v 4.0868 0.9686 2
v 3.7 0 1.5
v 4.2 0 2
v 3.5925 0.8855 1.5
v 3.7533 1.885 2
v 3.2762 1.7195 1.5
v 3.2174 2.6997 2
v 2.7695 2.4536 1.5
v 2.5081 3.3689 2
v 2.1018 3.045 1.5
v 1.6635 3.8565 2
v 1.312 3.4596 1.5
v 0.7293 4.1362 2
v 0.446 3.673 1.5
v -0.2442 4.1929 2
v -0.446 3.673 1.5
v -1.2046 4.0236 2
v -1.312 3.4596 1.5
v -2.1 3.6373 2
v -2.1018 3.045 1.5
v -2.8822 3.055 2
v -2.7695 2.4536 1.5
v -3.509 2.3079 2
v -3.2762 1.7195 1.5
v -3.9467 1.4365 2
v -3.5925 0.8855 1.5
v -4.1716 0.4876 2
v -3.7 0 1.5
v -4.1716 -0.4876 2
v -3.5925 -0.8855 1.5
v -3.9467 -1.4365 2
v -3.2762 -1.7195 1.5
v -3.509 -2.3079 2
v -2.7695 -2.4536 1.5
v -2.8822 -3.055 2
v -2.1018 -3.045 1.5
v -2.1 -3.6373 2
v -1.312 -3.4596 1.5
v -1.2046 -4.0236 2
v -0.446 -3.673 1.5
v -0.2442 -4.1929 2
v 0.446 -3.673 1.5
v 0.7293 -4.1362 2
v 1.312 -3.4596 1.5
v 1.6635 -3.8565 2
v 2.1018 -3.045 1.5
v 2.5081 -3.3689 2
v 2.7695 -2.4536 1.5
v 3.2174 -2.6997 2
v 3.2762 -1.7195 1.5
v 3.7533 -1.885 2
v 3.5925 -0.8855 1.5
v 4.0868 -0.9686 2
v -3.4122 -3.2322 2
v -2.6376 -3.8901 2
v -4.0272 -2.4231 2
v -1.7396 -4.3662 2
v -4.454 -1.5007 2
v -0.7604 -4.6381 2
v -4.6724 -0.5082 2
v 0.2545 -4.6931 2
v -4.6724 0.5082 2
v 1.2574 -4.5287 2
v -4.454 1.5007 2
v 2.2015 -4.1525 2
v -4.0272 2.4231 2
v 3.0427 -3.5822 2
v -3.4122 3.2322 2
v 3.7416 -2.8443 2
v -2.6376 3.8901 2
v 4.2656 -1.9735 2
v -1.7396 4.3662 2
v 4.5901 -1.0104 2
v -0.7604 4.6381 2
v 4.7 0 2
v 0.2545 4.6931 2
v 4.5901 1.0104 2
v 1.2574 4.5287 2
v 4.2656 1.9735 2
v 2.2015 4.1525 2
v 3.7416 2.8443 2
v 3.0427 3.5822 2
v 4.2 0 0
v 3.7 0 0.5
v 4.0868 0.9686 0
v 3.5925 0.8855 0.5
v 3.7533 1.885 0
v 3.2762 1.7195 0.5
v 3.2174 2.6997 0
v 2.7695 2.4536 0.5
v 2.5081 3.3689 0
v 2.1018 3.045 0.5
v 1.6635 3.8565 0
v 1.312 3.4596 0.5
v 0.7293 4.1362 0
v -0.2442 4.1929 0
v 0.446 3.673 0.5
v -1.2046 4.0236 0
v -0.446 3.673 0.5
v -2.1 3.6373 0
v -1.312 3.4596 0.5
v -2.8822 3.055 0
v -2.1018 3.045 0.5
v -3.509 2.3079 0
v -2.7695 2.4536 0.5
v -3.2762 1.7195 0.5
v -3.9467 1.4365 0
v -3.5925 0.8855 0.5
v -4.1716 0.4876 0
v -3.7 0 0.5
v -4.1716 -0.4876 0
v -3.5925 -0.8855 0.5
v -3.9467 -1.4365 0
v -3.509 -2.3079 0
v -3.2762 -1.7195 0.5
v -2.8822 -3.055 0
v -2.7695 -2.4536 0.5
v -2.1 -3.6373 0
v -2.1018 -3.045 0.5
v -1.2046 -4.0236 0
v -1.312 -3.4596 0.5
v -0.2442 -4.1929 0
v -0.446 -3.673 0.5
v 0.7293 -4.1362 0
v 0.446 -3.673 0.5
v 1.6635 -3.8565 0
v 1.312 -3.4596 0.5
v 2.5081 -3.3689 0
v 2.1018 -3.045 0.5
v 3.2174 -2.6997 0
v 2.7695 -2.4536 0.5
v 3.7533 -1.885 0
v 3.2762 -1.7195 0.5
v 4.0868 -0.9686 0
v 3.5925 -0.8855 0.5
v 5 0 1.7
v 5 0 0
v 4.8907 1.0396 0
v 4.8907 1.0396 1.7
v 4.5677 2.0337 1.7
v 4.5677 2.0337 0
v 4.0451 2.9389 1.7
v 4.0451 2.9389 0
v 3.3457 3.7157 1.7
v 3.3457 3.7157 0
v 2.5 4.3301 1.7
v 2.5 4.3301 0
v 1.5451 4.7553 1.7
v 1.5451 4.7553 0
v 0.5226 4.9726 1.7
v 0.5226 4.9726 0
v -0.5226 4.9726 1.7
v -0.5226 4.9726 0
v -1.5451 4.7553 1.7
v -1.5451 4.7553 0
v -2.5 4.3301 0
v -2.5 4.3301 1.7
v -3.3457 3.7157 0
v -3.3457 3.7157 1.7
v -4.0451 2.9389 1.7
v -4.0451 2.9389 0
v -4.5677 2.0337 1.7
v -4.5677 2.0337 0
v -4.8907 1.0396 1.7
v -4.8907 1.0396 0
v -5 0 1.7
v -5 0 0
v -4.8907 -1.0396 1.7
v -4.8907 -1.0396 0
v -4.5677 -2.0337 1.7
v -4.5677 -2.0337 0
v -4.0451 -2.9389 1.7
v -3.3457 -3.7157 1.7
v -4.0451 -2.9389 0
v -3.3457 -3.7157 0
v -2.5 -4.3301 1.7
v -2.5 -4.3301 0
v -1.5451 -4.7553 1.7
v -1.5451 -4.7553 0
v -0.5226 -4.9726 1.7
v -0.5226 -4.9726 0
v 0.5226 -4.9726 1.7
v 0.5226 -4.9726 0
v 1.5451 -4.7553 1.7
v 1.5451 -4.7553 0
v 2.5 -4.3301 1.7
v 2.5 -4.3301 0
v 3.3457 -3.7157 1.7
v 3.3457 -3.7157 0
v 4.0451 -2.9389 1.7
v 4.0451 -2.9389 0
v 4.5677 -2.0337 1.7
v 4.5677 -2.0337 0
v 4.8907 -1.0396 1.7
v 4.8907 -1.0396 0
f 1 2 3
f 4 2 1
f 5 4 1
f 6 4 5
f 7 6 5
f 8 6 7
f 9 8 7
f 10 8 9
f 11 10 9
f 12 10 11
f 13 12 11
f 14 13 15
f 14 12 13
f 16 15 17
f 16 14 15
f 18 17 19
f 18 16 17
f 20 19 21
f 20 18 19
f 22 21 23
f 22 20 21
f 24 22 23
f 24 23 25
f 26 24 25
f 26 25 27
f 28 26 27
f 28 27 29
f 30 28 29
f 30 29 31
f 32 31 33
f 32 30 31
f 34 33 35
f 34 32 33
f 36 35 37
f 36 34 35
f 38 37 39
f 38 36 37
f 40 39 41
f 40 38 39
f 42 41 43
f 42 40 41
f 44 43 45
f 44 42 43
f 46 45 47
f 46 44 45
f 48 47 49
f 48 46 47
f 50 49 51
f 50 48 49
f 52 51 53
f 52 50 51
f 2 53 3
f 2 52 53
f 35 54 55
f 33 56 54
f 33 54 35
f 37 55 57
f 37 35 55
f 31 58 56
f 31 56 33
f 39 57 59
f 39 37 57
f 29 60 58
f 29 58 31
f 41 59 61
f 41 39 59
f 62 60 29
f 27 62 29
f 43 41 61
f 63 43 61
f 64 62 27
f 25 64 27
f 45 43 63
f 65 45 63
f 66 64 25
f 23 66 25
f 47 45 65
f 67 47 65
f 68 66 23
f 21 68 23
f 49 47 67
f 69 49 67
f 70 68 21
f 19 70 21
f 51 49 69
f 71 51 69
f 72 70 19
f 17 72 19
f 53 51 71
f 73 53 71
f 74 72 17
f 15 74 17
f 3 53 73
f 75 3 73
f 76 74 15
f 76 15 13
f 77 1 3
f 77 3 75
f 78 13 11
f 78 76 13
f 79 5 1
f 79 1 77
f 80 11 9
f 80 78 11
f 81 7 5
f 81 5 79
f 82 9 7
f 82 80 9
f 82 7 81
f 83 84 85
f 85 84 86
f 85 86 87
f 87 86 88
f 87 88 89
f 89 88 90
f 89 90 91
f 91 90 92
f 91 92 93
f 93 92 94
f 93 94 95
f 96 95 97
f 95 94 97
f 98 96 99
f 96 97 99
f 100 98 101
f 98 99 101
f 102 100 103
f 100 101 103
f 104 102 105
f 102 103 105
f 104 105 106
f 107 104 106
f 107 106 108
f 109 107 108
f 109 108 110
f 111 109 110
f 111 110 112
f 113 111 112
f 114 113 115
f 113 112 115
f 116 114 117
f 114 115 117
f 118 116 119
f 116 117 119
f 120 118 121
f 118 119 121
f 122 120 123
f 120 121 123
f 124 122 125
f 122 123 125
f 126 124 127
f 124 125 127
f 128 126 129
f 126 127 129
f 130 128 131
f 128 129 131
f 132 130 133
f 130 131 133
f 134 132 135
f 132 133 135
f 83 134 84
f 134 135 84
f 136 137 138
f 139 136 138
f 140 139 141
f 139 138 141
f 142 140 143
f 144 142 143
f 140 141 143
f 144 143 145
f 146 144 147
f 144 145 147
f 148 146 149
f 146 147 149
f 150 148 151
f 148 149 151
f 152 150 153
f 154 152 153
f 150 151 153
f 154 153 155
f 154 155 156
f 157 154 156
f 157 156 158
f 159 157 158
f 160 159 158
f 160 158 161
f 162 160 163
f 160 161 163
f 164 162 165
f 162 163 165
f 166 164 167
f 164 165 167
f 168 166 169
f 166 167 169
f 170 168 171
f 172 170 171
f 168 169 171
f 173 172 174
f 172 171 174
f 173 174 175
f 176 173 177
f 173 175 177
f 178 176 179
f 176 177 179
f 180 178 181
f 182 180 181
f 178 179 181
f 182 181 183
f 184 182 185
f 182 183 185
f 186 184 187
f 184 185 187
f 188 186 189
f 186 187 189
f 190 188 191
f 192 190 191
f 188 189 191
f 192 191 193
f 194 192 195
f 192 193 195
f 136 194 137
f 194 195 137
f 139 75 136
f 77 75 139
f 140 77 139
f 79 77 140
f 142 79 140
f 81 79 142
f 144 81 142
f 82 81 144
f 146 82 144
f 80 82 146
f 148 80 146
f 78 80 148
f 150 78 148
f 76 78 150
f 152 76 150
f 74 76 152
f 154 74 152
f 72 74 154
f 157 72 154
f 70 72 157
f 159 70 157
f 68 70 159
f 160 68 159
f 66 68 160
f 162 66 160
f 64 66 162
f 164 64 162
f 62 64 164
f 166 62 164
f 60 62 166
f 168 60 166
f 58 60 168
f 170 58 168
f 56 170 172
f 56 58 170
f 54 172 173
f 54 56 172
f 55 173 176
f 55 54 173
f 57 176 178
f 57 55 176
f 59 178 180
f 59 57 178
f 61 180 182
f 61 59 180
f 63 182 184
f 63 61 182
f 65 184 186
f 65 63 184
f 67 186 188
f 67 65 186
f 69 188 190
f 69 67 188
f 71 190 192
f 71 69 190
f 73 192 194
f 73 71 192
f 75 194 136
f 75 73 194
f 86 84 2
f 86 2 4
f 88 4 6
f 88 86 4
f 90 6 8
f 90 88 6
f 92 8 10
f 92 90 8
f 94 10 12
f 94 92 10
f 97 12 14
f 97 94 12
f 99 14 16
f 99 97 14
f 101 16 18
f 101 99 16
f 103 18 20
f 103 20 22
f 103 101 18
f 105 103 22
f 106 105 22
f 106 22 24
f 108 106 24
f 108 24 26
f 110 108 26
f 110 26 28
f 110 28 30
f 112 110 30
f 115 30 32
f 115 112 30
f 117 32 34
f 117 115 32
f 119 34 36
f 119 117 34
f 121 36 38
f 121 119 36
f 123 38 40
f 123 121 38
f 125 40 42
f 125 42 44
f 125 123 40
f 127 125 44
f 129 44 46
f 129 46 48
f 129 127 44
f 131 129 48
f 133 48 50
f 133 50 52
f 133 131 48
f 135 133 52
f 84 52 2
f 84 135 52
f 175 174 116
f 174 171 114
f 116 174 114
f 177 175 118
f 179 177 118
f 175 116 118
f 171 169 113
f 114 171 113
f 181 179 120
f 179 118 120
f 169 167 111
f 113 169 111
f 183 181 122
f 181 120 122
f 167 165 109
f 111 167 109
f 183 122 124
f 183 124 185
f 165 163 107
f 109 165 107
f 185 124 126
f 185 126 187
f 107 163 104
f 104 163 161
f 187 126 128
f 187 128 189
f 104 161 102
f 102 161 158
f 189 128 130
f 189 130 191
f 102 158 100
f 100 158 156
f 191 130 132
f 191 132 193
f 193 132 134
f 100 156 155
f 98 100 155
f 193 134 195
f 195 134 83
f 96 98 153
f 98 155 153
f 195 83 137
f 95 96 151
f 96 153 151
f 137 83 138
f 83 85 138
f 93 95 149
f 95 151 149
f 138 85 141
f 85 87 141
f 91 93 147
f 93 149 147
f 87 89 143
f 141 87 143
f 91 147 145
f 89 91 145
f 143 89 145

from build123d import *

# Parameters (mm, degrees)
SKETCH1_R           = 5
SKETCH1_R_2         = 3.7
BOSS_EXTRUDE1_DEPTH = 2
CHAMFER1_SIZE       = 0.3
CHAMFER2_SIZE       = 0.5


with BuildPart() as part:
    # Sketch1 → Boss-Extrude1 (new body)
    with BuildSketch(Plane.XY):
        Circle(SKETCH1_R)
        Circle(SKETCH1_R_2, mode=Mode.SUBTRACT)
    extrude(amount=BOSS_EXTRUDE1_DEPTH)

    # Chamfer1
    chamfer1_edges = [part.edges().sort_by_distance(p)[0] for p in [
        (-5, 0, 2),
    ]]
    chamfer(chamfer1_edges, length=CHAMFER1_SIZE)

    # Chamfer2
    chamfer2_edges = [part.edges().sort_by_distance(p)[0] for p in [
        (-3.7, 0, 0),
        (-3.7, 0, 2),
    ]]
    chamfer(chamfer2_edges, length=CHAMFER2_SIZE)


solid = part.part
